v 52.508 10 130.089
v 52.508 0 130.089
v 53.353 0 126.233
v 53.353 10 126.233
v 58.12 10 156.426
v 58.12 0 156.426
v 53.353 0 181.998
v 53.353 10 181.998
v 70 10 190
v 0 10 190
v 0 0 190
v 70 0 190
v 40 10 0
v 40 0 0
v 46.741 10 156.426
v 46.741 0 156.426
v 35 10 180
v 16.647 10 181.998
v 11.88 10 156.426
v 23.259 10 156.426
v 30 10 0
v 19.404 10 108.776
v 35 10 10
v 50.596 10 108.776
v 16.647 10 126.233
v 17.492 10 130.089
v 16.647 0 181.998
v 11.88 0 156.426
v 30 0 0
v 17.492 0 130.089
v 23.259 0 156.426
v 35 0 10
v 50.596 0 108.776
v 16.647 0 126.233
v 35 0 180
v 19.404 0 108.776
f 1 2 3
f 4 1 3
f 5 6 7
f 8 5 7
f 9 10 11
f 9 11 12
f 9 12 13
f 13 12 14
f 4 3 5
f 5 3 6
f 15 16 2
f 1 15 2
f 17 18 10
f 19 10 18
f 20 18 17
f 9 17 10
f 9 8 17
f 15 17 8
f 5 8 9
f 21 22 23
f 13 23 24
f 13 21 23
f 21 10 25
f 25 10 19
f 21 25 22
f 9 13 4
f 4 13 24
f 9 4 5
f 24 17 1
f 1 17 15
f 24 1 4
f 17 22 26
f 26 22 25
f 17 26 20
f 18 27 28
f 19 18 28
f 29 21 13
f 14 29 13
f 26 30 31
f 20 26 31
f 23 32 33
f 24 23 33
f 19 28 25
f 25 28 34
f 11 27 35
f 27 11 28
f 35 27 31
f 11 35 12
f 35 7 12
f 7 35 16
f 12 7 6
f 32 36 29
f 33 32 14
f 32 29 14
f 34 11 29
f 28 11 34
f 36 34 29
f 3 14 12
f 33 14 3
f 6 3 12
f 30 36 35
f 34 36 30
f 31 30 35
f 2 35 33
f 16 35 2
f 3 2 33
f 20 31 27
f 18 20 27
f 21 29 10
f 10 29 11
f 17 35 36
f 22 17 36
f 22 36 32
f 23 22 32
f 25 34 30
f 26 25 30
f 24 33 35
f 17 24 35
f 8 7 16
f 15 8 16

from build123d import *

# Parameters (mm, degrees)
F0_W      = 80
F0_H      = 16
F1_DEPTH  = 160
F3_DEPTH  = 25
F5_DEPTH  = 25
F7_W      = 70
F7_H      = 10
F8_DEPTH  = 190
F10_DEPTH = 25
F12_DEPTH = 25
F14_DEPTH = 25
F16_DEPTH = 25


with BuildPart() as f1:
    # F0 (on Top) → F1 (new body)
    with BuildSketch(Plane.XY):
        with Locations((40, 8)):
            Rectangle(F0_W, F0_H)
    extrude(amount=F1_DEPTH)

    # F2 (on face) → F3 (cut)
    with BuildSketch(Plane.XZ):
        Polygon((0, 160), (0, 0), (32.5, 0), align=None)
    extrude(amount=-F3_DEPTH, mode=Mode.SUBTRACT)

    # F4 (on face) → F5 (cut)
    with BuildSketch(Plane.XZ):
        Polygon((47.5, 0), (80, 0), (80, 160), align=None)
    extrude(amount=-F5_DEPTH, mode=Mode.SUBTRACT)


with BuildPart() as f8:
    # F7 (on Top) → F8 (new body)
    with BuildSketch(Plane.XY):
        with Locations((35, 5)):
            Rectangle(F7_W, F7_H)
    extrude(amount=F8_DEPTH)

    # F9 (on face) → F10 (cut)
    with BuildSketch(Plane.XZ):
        Polygon((0, 190), (0, 0), (30, 0), align=None)
    extrude(amount=-F10_DEPTH, mode=Mode.SUBTRACT)

    # F11 (on face) → F12 (cut)
    with BuildSketch(Plane.XZ):
        Polygon((40, 0), (70, 0), (70, 190), align=None)
    extrude(amount=-F12_DEPTH, mode=Mode.SUBTRACT)

    # F13 (on face) → F14 (cut)
    with BuildSketch(Plane.XZ):
        Polygon((19.4037426527, 108.7762965329), (35, 10), (50.5962573473, 108.7762965329), (35, 180), align=None)
    extrude(amount=-F14_DEPTH, mode=Mode.SUBTRACT)

    # F15 (on face) → F16 (cut)
    with BuildSketch(Plane.XZ):
        Polygon((11.8801091279, 156.4259755233), (16.6473853285, 126.2332262527), (17.4916778251, 130.0888716859), (23.2588624734, 156.4259755233), (16.6473853285, 181.9978654385), align=None)
        Polygon((58.1198908721, 156.4259755233), (53.3526146715, 181.9978654385), (46.7411375266, 156.4259755233), (52.5083221749, 130.0888716859), (53.3526146715, 126.2332262527), align=None)
    extrude(amount=-F16_DEPTH, mode=Mode.SUBTRACT)


solid = f8.part
